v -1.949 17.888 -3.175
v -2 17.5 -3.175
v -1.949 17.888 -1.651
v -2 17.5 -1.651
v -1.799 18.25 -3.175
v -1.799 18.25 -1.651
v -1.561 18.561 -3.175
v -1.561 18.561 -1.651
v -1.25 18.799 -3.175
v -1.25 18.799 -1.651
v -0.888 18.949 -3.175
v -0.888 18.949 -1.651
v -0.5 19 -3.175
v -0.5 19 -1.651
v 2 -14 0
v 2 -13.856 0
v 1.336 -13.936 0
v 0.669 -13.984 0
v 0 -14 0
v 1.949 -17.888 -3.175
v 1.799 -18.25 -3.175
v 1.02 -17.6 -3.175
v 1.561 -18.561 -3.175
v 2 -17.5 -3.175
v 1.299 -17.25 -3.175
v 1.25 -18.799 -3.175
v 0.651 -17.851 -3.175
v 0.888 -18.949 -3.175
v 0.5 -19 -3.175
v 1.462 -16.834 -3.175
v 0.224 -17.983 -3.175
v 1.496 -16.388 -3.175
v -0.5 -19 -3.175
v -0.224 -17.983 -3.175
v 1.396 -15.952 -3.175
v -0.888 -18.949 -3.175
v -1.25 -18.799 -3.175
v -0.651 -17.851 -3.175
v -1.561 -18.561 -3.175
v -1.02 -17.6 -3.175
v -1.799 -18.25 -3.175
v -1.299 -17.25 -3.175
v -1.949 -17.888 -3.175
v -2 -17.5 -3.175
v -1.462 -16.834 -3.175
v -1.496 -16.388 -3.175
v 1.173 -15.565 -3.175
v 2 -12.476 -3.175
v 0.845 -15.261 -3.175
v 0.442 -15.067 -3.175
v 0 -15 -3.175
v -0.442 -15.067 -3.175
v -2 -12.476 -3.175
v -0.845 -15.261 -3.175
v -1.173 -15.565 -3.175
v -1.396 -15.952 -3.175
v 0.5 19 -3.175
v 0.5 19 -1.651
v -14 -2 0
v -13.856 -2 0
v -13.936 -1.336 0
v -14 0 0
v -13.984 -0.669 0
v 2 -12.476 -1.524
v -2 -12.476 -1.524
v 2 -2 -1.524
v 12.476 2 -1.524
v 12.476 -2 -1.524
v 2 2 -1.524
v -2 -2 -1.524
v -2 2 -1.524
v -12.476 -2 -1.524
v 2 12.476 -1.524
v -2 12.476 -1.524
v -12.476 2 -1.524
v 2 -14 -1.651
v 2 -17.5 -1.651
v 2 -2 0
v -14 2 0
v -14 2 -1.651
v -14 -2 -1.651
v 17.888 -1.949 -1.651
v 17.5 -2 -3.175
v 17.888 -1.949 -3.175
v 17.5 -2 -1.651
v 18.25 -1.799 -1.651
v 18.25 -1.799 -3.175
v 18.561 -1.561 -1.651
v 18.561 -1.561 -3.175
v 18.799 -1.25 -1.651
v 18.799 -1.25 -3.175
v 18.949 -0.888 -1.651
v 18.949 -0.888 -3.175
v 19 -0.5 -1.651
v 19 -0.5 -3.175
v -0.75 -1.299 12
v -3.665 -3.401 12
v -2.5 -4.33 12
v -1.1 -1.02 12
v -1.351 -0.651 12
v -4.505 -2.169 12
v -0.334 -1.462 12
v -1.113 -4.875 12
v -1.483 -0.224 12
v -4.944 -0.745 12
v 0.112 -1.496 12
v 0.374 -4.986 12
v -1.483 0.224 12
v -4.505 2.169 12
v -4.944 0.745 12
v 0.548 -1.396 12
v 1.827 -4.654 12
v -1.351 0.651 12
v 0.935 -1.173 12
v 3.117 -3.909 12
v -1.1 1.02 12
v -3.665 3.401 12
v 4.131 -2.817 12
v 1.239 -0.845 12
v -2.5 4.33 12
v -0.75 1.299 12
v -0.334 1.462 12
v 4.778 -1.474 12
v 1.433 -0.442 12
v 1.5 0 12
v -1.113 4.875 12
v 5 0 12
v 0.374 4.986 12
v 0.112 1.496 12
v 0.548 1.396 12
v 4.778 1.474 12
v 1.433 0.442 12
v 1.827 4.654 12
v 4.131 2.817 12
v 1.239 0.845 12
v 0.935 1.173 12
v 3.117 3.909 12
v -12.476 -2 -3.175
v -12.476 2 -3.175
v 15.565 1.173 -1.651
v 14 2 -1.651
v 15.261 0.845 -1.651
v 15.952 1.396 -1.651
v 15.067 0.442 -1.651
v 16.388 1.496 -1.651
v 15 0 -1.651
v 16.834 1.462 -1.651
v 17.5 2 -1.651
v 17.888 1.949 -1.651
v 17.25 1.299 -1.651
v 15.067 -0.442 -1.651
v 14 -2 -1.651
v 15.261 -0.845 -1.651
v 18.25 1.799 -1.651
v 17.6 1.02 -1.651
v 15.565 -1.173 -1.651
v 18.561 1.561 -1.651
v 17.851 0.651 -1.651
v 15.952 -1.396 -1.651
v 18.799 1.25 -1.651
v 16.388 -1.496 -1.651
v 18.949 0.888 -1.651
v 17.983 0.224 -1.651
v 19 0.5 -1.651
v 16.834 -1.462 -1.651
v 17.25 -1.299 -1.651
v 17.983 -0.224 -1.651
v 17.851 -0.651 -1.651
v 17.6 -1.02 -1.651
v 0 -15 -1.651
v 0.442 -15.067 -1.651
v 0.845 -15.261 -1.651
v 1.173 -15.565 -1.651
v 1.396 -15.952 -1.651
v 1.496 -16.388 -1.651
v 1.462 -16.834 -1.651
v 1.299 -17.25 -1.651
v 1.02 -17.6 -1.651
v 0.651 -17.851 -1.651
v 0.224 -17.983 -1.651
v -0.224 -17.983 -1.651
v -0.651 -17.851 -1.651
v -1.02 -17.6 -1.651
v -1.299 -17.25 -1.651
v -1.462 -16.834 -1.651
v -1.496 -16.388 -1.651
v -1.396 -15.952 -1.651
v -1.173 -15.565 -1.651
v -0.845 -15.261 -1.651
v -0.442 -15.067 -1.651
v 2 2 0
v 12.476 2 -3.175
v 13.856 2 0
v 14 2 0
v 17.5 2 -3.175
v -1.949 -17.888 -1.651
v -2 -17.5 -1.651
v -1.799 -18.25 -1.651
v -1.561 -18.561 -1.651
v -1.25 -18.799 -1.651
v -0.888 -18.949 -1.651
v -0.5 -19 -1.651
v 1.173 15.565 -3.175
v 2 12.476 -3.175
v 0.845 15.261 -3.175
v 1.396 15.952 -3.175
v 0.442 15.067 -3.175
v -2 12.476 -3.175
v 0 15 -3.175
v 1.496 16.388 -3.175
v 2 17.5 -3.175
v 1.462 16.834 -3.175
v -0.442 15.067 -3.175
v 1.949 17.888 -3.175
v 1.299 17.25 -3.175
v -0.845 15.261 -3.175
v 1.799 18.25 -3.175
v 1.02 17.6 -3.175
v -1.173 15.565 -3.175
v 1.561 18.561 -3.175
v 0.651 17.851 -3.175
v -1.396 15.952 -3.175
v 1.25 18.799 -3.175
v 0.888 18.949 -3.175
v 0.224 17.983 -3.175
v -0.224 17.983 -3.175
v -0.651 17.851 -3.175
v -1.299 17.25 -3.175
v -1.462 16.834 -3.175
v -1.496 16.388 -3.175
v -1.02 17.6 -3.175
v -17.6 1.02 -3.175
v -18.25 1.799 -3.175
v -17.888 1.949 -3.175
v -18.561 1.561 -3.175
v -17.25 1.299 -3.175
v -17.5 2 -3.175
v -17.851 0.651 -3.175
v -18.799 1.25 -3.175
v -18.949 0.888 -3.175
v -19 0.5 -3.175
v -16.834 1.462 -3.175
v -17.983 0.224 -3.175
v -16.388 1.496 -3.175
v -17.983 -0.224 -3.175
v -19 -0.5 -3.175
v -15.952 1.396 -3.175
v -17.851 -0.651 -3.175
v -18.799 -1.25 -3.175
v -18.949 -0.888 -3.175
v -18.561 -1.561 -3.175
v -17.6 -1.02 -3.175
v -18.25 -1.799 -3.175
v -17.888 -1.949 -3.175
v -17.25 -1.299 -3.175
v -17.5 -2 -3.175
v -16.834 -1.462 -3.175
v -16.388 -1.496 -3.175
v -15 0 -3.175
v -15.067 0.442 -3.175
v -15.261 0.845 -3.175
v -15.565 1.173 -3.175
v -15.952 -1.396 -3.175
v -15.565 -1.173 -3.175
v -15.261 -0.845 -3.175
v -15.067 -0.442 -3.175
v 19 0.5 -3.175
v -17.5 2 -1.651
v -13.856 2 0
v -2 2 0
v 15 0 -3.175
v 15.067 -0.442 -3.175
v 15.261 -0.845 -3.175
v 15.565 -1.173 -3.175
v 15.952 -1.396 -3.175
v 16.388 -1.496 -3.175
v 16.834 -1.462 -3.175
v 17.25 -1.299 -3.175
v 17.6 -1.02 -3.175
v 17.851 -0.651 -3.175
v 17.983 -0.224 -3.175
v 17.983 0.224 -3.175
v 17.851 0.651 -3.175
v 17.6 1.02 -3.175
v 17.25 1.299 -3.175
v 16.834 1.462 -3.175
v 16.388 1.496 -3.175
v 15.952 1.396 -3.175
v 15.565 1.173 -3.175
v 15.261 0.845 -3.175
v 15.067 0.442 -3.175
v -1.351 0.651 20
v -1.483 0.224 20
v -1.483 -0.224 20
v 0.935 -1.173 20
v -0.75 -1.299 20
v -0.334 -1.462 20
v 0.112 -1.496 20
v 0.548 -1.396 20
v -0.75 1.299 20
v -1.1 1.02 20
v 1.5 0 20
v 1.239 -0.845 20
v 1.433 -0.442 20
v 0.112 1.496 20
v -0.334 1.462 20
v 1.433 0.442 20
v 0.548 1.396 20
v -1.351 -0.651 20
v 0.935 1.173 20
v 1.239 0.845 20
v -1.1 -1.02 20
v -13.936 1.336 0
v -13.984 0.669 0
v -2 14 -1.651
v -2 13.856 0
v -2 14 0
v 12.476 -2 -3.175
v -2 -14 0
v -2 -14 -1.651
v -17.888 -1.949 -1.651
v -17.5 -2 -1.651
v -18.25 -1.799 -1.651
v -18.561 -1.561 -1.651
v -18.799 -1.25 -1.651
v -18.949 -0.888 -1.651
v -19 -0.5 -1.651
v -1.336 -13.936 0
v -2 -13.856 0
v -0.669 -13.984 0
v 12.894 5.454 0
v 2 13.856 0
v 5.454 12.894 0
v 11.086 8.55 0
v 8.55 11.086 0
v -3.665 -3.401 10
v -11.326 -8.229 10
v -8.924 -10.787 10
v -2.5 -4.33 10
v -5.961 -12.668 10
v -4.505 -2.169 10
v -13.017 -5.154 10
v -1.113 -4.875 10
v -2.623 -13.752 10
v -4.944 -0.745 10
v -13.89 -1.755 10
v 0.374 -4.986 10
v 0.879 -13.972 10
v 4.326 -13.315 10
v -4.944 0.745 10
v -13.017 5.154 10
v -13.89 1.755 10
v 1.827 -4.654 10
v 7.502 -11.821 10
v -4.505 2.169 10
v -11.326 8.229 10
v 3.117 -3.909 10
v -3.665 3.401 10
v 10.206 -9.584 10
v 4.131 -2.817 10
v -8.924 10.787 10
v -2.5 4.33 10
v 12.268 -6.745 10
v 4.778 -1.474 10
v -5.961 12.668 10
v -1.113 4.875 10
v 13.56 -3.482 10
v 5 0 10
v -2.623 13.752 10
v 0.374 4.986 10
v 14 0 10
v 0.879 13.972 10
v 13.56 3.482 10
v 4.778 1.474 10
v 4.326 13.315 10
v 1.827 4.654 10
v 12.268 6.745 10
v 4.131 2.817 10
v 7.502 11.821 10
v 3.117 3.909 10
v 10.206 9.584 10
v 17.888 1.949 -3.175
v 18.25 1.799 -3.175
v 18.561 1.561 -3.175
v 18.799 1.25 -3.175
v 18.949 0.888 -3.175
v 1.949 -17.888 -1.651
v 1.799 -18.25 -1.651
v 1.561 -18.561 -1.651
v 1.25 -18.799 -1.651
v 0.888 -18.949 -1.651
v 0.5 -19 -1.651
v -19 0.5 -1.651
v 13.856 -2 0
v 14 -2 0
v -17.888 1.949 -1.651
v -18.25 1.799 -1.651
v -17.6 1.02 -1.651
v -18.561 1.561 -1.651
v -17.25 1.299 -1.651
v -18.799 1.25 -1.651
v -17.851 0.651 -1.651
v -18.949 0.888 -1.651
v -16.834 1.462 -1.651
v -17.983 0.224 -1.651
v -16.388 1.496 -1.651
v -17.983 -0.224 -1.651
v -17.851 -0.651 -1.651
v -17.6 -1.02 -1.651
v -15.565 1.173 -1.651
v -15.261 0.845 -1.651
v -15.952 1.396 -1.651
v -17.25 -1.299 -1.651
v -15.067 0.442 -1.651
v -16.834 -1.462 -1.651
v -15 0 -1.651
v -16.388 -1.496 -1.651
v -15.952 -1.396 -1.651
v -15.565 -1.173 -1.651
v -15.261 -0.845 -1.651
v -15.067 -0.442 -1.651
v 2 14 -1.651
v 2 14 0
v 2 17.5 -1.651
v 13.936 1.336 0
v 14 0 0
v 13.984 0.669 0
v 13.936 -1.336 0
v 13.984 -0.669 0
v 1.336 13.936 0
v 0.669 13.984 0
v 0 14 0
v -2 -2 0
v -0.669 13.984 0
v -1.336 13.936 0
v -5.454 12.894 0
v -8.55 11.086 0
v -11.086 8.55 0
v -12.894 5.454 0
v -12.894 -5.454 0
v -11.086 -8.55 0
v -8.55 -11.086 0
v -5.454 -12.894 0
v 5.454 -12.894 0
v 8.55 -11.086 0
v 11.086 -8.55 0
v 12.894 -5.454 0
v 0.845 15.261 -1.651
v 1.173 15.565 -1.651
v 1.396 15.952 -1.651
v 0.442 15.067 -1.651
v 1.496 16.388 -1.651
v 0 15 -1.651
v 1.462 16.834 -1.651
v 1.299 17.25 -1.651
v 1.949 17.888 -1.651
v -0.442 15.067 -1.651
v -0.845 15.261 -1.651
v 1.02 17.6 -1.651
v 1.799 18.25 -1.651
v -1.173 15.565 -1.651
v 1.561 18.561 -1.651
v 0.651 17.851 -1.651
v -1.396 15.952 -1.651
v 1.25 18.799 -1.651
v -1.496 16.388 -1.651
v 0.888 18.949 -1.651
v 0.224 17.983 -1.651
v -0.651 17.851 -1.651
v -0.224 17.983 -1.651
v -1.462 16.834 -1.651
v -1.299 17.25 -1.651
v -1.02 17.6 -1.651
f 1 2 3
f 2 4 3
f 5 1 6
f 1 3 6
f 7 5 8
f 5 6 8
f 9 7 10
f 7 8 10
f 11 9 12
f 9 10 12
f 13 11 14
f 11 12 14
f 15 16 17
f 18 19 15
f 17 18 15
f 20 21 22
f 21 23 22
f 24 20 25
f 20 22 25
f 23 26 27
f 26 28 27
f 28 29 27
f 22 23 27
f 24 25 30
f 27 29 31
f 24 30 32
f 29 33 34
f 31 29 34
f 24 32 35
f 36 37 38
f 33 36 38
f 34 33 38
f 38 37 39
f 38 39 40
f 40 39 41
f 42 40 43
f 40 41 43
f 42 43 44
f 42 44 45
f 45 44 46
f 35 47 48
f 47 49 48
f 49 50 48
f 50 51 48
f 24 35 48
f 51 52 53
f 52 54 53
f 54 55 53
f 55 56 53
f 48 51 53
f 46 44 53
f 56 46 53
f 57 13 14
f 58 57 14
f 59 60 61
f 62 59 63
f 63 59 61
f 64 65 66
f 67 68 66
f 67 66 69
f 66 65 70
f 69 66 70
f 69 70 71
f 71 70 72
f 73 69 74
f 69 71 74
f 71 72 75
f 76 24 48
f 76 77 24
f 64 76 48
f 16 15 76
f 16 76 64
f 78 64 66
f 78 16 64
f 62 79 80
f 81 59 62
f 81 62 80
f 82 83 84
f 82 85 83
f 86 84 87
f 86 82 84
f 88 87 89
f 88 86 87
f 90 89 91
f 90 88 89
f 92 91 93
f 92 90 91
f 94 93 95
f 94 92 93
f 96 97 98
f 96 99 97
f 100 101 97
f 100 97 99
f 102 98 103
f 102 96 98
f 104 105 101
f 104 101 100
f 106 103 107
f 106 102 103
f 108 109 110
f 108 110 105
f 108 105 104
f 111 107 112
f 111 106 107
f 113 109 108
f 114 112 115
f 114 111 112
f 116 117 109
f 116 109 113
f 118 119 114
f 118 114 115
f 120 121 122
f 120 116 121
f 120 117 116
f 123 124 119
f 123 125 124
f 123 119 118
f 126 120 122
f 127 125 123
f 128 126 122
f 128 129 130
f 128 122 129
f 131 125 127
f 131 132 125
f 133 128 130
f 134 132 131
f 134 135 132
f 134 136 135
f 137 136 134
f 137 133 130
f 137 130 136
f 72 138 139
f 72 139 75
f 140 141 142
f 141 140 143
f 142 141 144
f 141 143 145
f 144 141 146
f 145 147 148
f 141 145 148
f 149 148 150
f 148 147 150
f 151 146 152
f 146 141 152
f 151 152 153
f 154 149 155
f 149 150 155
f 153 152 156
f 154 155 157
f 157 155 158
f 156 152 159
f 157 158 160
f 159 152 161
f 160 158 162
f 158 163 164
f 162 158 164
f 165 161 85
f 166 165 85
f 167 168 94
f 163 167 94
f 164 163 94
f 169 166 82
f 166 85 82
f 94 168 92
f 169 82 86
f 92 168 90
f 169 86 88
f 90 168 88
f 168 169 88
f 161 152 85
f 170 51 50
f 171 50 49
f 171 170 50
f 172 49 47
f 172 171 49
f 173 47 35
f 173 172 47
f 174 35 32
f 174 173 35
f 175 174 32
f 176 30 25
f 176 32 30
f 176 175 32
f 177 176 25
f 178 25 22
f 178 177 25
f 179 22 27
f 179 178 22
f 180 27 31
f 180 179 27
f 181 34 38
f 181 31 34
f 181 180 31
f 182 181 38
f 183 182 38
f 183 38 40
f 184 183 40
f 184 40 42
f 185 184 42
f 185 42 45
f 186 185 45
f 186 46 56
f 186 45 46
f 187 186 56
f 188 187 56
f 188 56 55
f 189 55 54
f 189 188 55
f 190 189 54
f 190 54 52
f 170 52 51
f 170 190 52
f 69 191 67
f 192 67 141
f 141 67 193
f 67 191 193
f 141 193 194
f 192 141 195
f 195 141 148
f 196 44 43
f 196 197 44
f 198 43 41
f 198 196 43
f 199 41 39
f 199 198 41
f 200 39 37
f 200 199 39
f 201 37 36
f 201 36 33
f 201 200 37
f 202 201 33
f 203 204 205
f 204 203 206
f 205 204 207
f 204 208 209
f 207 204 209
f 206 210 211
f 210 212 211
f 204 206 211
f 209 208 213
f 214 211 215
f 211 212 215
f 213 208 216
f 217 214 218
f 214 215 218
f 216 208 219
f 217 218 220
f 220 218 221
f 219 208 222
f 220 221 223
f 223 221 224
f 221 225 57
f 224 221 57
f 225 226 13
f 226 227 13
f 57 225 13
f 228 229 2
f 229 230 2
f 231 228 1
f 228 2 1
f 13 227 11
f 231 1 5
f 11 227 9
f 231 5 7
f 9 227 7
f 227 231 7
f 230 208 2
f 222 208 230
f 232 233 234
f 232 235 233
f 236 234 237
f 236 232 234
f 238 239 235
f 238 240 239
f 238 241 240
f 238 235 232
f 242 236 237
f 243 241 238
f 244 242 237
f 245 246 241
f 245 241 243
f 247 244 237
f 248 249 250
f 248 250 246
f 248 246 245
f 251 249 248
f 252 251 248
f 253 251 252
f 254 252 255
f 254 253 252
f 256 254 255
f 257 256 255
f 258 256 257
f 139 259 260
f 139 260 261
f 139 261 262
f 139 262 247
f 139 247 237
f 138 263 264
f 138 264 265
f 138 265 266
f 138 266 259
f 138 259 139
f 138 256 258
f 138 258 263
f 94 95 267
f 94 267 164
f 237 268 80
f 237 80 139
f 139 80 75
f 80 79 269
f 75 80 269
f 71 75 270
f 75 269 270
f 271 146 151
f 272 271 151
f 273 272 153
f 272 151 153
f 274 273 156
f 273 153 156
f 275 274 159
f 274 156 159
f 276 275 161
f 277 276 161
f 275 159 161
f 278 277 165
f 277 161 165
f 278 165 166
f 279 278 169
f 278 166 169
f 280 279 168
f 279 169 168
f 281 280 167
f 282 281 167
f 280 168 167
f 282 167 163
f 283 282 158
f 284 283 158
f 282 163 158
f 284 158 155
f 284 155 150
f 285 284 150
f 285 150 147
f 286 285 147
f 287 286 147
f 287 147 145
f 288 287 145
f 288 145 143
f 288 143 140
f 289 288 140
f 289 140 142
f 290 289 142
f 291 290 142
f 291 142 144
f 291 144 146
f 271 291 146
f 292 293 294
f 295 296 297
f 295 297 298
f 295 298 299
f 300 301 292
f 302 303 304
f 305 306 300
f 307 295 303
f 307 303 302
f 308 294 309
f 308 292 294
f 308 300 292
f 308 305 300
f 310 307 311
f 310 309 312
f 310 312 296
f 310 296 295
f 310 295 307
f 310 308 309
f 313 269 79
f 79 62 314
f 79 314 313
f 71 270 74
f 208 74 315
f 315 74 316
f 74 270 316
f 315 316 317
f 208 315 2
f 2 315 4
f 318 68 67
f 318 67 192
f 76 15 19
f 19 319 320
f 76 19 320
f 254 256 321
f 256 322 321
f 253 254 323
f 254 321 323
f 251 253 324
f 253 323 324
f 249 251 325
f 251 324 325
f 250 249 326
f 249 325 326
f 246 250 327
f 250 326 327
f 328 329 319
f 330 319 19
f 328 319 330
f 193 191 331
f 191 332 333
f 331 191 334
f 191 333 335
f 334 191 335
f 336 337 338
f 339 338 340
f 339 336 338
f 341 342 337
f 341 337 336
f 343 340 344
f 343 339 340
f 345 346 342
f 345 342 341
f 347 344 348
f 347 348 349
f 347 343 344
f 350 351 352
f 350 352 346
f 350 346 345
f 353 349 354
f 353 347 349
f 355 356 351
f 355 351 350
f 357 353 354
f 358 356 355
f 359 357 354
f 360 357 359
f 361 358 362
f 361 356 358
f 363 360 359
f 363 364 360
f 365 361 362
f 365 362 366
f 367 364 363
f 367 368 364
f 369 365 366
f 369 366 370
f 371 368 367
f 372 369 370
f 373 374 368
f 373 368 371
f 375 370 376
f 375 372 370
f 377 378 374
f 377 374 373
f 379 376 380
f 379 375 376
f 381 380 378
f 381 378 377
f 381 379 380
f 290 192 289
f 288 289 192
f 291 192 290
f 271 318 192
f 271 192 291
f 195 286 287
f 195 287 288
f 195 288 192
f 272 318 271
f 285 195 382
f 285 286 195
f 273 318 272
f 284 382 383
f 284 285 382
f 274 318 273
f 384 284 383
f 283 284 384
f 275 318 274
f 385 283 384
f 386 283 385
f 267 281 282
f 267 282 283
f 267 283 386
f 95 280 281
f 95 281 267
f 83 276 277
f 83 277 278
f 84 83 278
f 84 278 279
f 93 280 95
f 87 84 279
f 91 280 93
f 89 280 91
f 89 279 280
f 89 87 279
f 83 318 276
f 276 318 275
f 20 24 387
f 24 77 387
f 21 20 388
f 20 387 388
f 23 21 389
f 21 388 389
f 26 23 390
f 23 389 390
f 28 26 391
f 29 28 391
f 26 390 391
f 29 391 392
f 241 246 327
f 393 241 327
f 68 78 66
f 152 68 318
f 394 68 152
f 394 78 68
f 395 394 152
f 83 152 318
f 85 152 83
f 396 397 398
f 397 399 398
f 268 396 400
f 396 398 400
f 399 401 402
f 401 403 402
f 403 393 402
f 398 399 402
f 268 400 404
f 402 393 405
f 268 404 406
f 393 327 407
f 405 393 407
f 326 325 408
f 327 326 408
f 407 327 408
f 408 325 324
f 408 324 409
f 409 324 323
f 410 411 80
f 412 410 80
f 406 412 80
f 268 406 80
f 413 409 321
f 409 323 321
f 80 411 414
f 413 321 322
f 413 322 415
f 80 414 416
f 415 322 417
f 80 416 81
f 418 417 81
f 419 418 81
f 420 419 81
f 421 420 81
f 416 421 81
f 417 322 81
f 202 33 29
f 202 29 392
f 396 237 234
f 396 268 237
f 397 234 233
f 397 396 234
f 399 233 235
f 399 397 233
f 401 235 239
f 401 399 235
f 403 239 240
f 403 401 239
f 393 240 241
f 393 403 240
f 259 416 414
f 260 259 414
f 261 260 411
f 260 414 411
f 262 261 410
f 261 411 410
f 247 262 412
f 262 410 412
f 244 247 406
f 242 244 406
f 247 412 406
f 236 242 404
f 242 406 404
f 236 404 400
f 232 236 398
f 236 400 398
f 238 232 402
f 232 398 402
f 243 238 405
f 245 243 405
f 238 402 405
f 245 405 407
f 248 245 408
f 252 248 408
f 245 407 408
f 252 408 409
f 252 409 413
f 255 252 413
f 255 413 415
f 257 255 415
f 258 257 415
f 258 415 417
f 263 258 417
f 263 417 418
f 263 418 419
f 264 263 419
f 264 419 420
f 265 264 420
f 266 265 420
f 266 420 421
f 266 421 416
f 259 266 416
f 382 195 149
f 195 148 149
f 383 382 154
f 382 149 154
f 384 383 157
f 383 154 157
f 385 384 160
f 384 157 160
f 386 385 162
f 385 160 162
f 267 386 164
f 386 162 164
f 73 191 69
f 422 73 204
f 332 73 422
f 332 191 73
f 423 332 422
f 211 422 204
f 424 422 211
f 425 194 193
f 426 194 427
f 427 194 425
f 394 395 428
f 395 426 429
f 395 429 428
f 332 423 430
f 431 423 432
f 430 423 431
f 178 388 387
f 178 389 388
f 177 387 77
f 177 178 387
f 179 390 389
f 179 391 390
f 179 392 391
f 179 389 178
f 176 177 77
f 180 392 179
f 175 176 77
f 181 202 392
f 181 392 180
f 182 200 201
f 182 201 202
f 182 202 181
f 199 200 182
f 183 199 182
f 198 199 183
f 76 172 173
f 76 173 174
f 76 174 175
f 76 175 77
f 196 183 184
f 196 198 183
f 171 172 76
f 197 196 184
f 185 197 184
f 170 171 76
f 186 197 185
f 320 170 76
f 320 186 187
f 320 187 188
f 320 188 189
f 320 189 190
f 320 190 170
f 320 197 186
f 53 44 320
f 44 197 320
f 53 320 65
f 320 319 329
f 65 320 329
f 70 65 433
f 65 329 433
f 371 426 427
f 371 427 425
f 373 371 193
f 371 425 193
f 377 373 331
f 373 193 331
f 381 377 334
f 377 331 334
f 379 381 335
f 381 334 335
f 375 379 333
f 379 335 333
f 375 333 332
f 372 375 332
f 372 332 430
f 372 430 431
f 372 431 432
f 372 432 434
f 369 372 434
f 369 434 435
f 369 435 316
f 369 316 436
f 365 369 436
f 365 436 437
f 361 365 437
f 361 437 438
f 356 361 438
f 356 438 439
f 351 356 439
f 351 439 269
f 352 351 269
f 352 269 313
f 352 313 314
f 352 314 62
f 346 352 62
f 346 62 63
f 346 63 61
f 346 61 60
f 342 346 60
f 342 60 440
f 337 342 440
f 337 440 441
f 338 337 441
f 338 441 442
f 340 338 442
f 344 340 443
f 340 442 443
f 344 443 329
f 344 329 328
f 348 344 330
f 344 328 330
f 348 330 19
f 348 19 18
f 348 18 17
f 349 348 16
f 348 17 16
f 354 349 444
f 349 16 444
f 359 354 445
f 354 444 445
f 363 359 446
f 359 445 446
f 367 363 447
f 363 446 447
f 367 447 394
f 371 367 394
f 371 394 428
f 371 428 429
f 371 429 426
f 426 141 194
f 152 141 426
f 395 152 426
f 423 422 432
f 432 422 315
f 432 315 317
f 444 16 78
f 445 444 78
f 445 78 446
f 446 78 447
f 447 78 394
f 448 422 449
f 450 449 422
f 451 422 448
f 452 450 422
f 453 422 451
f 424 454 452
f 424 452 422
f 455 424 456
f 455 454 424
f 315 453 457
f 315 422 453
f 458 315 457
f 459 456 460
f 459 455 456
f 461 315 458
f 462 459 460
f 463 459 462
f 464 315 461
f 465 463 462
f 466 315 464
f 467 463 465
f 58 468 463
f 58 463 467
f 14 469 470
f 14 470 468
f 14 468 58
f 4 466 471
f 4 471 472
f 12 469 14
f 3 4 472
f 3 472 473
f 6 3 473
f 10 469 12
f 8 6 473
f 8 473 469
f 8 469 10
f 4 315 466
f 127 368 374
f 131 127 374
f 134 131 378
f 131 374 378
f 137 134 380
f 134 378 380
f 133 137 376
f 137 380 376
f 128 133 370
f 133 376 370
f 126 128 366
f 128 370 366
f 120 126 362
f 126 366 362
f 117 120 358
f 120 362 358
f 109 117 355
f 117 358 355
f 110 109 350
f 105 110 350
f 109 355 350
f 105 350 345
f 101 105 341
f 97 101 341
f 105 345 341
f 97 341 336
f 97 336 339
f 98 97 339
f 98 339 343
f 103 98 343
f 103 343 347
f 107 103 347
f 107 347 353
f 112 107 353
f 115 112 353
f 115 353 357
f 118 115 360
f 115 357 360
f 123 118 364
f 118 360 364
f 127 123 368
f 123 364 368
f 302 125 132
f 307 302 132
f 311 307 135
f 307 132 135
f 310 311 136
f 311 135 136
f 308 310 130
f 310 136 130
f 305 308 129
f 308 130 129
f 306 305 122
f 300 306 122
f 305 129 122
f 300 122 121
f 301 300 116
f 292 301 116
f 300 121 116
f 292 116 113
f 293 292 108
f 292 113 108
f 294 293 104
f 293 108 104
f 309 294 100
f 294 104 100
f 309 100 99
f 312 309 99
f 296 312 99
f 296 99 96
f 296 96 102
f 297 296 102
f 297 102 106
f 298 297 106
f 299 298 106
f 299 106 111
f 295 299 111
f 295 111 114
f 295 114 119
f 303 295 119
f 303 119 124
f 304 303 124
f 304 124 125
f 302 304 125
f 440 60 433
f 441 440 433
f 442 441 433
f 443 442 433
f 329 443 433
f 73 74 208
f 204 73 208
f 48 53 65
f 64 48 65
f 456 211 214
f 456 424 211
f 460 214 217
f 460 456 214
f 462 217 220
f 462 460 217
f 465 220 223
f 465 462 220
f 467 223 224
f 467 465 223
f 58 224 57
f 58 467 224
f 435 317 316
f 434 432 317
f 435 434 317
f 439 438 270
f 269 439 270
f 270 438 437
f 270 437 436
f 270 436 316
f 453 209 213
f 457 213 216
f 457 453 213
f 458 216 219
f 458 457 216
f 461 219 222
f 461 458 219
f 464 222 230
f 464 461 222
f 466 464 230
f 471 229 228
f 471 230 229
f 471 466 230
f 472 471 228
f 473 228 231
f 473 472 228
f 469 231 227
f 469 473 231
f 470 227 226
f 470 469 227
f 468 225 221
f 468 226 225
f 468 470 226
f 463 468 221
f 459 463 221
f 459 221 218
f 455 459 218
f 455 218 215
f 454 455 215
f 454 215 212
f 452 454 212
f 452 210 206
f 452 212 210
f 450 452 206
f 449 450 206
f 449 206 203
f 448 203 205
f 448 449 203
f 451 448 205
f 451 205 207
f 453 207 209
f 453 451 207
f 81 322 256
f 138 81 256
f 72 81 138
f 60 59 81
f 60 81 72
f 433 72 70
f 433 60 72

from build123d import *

# Parameters (mm, degrees)
F0_R     = 14
F1_DEPTH = 10
F2_R     = 5
F2_R_2   = 1.5
F3_DEPTH = 2
F4_DEPTH = 10
F5_W     = 5
F5_H     = 1.524
F6_DEPTH = 2
F7_R     = 1.5
F8_DEPTH = 25.4
F9_R     = 1.5


# Not quite as in the source:
# - a pattern or mirror of a feature is missing from the dataset's text; its kind, count and spacing are read off the source's solid


with BuildPart() as f1:
    # F0 (on Top) → F1 (new body)
    with BuildSketch(Plane.XY):
        Circle(F0_R)
    extrude(amount=F1_DEPTH)

    # F2 (on face) → F3 (join)
    with BuildSketch(Plane.XY.offset(10)):
        Circle(F2_R)
        Circle(F2_R_2, mode=Mode.SUBTRACT)
    extrude(amount=F3_DEPTH)

    # F4 (add): a face of the model
    f4_faces = [f1.faces().sort_by_distance(p)[0] for p in [
        (0, 0, 10),
    ]]
    extrude(f4_faces, amount=F4_DEPTH)

    # F5 (on Front) → F6 (join, symmetric)
    with BuildSketch(Plane.XZ):
        Polygon((14, 0), (-14, 0), (-14, -1.524), (-12.476, -1.524), (12.476, -1.524), (14, -1.524), align=None)
        Polygon((-12.476, -1.524), (-14, -1.524), (-14, -1.651), (-14, -3.175), (-12.476, -3.175), align=None)
        with Locations((-16.5, -2.413)):
            Rectangle(F5_W, F5_H)
        Polygon((14, -1.651), (14, -1.524), (12.476, -1.524), (12.476, -3.175), (14, -3.175), align=None)
        with Locations((16.5, -2.413)):
            Rectangle(F5_W, F5_H)
    f6 = extrude(amount=F6_DEPTH, both=True)

    # F6_copies: F6 across plane
    add(f6.mirror(Plane(origin=(0, 0, 0), x_dir=(-0.7071067812, -0.7071067812, 0), z_dir=(-0.7071067812, 0.7071067812, 0))))

    # F7 (on face) → F8 (cut)
    with BuildSketch(Plane.XY.offset(-1.651)):
        with Locations((-16.5, 0)):
            Circle(F7_R)
        with BuildLine():
            ThreePointArc((18, 0), (16.5, 1.5), (15, 0))
            ThreePointArc((15, 0), (16.5, -1.5), (18, 0))
        make_face()
    f8 = extrude(amount=-F8_DEPTH, mode=Mode.SUBTRACT)

    # F8_copies: F8 across plane
    add(f8.mirror(Plane(origin=(0, 0, 0), x_dir=(0.7071067812, 0.7071067812, 0), z_dir=(0.7071067812, -0.7071067812, 0))), mode=Mode.SUBTRACT)

    # F9
    f9_edges = [f1.edges().sort_by_distance(p)[0] for p in [
        (-19, -2, -2.413),
        (-19, 2, -2.413),
        (19, -2, -2.413),
        (19, 2, -2.413),
        (2, 19, -2.413),
        (-2, 19, -2.413),
        (-2, -19, -2.413),
        (2, -19, -2.413),
    ]]
    fillet(f9_edges, radius=F9_R)


solid = f1.part
